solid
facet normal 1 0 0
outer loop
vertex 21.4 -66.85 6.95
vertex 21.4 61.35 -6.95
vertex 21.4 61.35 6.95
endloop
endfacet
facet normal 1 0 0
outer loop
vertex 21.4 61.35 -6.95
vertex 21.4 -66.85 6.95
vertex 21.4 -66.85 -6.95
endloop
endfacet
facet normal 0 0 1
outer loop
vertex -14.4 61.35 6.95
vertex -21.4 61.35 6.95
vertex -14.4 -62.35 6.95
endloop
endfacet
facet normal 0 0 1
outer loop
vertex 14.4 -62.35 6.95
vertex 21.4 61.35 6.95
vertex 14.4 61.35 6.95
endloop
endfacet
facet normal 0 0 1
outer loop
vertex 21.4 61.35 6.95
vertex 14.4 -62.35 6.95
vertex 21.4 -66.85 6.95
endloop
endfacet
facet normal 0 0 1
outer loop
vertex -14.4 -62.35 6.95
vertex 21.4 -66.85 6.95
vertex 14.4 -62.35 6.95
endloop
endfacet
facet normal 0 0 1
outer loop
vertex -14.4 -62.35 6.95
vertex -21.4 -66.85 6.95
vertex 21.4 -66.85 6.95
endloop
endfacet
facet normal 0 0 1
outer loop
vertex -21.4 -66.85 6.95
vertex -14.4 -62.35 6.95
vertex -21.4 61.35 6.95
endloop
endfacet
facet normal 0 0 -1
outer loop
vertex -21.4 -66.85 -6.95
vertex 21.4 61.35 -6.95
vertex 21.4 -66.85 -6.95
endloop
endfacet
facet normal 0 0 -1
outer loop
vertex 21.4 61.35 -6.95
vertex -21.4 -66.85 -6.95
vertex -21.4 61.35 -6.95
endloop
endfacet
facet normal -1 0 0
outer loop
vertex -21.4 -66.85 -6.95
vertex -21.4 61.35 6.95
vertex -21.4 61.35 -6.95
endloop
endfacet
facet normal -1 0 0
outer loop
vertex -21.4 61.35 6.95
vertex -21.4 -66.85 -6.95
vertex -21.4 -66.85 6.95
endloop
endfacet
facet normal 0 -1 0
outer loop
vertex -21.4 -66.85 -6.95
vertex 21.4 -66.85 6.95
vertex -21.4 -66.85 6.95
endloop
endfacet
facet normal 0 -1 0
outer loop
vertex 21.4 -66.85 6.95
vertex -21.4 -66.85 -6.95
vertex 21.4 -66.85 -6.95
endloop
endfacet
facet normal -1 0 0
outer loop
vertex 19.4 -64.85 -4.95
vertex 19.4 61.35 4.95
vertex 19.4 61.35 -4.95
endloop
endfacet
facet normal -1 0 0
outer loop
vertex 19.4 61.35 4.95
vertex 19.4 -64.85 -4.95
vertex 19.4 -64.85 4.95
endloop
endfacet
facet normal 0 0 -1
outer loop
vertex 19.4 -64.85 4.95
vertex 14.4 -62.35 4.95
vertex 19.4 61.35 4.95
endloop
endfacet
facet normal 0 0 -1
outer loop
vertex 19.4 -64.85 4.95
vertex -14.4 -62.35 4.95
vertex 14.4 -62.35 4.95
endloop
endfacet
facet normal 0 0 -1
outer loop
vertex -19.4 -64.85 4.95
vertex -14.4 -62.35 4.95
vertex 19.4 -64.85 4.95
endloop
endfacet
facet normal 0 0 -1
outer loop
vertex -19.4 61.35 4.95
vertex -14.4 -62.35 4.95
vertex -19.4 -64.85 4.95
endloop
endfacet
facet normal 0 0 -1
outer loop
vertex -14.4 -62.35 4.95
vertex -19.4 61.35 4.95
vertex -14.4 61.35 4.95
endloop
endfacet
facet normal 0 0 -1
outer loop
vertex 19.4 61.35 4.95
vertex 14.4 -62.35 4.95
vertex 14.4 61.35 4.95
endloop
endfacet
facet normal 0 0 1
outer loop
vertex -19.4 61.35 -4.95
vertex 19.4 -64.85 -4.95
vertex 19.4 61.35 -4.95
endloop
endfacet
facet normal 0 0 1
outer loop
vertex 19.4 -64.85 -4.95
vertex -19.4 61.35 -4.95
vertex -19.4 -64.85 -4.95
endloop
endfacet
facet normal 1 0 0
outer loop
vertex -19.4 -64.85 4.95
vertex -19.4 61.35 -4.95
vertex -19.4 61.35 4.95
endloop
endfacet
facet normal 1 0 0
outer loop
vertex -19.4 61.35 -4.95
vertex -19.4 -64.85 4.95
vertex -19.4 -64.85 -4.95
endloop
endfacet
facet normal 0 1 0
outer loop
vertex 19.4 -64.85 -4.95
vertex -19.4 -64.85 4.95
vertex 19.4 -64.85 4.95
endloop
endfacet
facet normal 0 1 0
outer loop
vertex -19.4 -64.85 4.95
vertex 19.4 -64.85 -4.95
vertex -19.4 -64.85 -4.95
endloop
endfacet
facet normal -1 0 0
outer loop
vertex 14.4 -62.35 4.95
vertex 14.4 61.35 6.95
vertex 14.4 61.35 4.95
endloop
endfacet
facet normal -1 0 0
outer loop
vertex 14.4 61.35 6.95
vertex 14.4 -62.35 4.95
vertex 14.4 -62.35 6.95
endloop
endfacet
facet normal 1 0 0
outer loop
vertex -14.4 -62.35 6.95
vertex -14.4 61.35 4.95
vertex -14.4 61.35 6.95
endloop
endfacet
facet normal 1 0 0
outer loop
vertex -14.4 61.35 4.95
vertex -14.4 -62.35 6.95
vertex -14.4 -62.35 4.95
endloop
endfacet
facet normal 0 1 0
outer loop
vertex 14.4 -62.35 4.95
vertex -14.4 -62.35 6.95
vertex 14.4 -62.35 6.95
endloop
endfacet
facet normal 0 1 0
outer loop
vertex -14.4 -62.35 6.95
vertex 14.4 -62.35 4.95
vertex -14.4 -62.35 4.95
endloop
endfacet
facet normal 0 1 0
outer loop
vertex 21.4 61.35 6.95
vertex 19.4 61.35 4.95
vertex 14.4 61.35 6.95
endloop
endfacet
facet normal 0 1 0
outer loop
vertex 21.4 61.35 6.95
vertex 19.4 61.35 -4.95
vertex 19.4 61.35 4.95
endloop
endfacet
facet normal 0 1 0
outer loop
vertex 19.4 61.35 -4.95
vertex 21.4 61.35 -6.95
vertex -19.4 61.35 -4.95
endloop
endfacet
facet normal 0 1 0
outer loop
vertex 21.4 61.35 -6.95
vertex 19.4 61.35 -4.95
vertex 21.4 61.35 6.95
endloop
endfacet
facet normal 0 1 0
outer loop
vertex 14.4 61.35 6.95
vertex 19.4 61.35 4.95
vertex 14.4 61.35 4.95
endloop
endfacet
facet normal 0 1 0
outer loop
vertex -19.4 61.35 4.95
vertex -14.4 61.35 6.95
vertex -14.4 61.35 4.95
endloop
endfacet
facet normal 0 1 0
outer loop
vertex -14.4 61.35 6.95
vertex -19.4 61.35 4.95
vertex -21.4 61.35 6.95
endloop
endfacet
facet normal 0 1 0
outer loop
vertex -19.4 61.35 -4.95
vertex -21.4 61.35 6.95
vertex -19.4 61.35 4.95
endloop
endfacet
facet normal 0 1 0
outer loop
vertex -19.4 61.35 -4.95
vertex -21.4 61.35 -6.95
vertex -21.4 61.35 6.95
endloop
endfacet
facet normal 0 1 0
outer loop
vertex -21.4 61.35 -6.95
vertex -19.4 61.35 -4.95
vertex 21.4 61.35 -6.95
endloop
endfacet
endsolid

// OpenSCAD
boxLength = 129.7;
boxWidth = 38.8;
boxHeight = 9.9;

thickness = 2;
overhangs = 5;


difference() {
    cube([boxWidth + thickness * 2, boxLength + thickness * 2, boxHeight + thickness * 2], center = true);
    
    cube([boxWidth, boxLength, boxHeight], center = true);
    
    translate([0, 0, (boxHeight + thickness) / 2])
        cube([boxWidth - overhangs * 2, boxLength - overhangs, thickness], center = true);
 
    translate([0,boxLength / 2,0])
        cube([boxWidth + thickness * 2, thickness + overhangs,boxHeight + thickness * 2 ], center = true);
};
